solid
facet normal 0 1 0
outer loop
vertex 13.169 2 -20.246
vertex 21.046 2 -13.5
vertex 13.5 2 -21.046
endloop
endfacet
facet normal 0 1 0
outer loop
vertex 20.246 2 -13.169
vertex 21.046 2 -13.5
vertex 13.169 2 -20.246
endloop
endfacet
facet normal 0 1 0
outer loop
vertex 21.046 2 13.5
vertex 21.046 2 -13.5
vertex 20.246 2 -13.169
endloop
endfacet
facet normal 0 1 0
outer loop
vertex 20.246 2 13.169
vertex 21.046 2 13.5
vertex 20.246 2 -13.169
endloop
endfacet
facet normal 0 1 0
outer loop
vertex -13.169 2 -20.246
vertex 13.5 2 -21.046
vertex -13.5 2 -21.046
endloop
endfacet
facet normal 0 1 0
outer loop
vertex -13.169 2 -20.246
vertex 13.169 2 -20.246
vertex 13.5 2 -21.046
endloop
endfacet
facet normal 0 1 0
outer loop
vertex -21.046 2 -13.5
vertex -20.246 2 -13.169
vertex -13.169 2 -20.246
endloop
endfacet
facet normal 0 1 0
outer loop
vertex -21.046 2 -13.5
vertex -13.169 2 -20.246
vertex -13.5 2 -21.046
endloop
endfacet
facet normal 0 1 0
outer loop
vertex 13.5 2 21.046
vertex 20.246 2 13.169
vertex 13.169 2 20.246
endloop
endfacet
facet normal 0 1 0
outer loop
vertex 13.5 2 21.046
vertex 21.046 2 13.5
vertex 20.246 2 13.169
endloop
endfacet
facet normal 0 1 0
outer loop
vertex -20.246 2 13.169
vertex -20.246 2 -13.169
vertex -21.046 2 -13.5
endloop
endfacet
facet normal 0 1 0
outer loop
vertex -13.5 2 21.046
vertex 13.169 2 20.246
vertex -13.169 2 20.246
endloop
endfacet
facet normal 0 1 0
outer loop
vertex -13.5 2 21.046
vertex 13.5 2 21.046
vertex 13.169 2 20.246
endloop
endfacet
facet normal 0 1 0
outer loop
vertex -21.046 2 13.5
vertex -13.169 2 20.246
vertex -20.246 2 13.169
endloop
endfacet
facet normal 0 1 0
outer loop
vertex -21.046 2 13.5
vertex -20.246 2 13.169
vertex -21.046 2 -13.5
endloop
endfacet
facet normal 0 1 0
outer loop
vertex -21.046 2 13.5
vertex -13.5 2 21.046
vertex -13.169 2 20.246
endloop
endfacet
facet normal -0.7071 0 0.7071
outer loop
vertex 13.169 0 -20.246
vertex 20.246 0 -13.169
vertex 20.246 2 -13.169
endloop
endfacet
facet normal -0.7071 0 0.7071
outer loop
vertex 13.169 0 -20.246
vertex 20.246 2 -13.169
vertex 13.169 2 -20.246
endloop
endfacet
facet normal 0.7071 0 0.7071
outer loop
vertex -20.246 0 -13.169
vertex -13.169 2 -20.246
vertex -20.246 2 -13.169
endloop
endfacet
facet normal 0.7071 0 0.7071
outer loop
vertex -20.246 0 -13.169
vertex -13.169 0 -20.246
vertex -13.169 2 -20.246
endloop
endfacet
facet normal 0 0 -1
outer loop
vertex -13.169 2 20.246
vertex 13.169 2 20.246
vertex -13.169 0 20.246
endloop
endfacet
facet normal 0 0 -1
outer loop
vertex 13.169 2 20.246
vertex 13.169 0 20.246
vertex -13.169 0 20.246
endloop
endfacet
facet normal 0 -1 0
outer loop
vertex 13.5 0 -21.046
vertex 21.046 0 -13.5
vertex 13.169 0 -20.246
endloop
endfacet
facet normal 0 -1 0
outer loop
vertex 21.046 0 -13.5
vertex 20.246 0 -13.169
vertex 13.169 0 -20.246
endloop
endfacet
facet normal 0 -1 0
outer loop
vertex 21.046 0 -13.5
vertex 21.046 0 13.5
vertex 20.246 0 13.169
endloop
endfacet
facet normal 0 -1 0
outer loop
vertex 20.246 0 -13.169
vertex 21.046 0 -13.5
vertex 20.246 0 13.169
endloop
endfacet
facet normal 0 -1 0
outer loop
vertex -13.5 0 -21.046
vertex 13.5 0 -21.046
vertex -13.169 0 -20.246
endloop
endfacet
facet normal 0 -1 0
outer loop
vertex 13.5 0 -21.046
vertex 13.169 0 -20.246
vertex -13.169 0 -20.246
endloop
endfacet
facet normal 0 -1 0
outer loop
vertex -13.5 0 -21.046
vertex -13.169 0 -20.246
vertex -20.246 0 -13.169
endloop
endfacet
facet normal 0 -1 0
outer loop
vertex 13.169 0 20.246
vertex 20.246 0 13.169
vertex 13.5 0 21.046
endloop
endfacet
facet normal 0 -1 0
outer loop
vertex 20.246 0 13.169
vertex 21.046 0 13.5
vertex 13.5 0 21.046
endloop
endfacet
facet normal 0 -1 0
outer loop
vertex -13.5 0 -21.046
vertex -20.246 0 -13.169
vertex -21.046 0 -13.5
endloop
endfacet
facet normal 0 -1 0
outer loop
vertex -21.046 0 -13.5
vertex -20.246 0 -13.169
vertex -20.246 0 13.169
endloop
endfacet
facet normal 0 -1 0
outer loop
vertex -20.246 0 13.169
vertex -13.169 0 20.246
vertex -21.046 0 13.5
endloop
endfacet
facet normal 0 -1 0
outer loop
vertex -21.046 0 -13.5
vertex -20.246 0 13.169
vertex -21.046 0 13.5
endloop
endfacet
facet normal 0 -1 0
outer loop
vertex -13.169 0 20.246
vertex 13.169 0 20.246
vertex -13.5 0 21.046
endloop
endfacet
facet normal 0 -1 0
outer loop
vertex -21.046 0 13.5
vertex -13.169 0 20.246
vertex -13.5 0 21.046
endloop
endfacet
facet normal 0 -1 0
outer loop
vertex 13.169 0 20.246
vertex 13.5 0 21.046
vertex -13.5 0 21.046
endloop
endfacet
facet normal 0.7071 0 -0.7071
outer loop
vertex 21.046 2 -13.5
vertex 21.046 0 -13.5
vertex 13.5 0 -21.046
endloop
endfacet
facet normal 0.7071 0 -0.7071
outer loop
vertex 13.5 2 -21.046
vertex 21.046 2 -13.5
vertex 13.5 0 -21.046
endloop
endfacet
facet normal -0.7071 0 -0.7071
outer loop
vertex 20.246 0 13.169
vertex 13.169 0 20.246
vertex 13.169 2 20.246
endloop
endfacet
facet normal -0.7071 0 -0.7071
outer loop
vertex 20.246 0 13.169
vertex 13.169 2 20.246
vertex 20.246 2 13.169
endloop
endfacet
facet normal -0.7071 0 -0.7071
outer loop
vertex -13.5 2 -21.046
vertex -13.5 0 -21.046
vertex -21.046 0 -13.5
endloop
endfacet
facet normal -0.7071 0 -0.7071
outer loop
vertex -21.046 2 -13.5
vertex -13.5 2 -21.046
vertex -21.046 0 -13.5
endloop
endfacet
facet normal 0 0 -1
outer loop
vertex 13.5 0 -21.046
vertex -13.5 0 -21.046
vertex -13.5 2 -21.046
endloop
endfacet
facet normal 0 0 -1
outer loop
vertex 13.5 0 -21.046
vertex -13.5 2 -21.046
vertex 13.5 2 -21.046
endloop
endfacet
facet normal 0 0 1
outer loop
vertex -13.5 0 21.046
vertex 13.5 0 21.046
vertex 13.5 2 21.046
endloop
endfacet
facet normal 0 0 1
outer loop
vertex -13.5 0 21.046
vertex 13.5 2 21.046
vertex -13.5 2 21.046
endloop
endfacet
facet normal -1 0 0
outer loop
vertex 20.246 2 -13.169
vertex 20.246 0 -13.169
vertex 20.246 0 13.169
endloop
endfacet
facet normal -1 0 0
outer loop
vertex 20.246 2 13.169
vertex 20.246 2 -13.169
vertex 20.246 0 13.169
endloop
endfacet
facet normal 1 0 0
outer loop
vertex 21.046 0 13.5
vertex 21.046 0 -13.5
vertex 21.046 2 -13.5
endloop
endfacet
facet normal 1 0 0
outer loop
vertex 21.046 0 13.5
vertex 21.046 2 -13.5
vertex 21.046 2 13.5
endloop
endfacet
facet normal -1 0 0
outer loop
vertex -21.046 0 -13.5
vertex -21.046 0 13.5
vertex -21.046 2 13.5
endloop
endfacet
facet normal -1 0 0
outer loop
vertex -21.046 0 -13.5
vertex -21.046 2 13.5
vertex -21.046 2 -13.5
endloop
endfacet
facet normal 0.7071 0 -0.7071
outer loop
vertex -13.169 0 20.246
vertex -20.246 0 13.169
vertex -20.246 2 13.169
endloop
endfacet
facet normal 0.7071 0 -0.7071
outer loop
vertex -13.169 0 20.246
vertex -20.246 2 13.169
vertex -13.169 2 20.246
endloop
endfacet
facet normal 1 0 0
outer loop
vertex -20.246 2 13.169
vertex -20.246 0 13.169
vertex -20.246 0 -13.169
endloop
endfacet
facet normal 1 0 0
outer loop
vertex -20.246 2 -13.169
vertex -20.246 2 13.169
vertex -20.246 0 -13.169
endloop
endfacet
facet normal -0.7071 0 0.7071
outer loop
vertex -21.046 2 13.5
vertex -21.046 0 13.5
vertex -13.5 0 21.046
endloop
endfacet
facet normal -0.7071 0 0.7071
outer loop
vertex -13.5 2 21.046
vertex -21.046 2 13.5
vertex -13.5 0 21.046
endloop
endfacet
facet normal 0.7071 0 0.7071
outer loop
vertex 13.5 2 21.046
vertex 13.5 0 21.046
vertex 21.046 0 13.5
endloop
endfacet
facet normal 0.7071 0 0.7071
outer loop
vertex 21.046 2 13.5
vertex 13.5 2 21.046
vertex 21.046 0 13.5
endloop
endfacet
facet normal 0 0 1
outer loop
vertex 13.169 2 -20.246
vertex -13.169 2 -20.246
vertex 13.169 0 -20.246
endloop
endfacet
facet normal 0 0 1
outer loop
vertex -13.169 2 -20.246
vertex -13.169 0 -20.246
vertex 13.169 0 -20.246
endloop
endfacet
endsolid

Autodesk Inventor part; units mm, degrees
ref_plane "YZ Plane" through (0, 0, 0) normal (1, 0, 0) x (0, 1, 0)
ref_plane "XZ Plane" through (0, 0, 0) normal (0, 1, 0) x (-1, 0, 0)
ref_plane "XY Plane" through (0, 0, 0) normal (0, 0, 1) x (1, 0, 0)
sketch "스케치1" plane through (0, 0, 0) normal (0, 1, 0) x (-1, 0, 0)
  line L0 (-32.5919, 13.5) -> (-13.5, 32.5919)
  line L1 (-13.5, 32.5919) -> (13.5, 32.5919)
  line L2 (13.5, 32.5919) -> (32.5919, 13.5)
  line L3 (32.5919, 13.5) -> (32.5919, -13.5)
  line L4 (32.5919, -13.5) -> (13.5, -32.5919)
  line L5 (13.5, -32.5919) -> (-13.5, -32.5919)
  line L6 (-13.5, -32.5919) -> (-32.5919, -13.5)
  line L7 (-32.5919, -13.5) -> (-32.5919, 13.5)
  line L8 (21.0459, 13.5) -> (21.0459, -13.5)
  line L9 (-21.0459, -13.5) -> (-21.0459, 13.5)
  line L10 (13.5, -21.0459) -> (-13.5, -21.0459)
  line L11 (-13.5, 21.0459) -> (13.5, 21.0459)
  line L12 (13.5, -21.0459) -> (21.0459, -13.5)
  line L13 (21.0459, 13.5) -> (13.5, 21.0459)
  line L14 (-13.5, 21.0459) -> (-21.0459, 13.5)
  line L15 (-21.0459, -13.5) -> (-13.5, -21.0459)
  point P0 (0, 0)
  point P1 (0, 0)
  point P2 (0, 21.0459)
  point P3 (0, -32.5919)
  dimension "d0" = 27
  dimension "d1" = 11.546
  dimension "d2" = 11.546
  dimension "d3" = 11.546
  dimension "d4" = 11.546
extrude "돌출1" add sketch "스케치1" along normal blind 2 contours L8 L12 L10 L15 L9 L14 L11 L13
shell "쉘1" thickness 0.8 removed faces 2 at (7.0153, 0, 4.5) at (7.0153, 2, 4.5)
properties part number "팔각형 OV-PAM 5패턴 층 한개 부피 구하기 0도 - 수정"
